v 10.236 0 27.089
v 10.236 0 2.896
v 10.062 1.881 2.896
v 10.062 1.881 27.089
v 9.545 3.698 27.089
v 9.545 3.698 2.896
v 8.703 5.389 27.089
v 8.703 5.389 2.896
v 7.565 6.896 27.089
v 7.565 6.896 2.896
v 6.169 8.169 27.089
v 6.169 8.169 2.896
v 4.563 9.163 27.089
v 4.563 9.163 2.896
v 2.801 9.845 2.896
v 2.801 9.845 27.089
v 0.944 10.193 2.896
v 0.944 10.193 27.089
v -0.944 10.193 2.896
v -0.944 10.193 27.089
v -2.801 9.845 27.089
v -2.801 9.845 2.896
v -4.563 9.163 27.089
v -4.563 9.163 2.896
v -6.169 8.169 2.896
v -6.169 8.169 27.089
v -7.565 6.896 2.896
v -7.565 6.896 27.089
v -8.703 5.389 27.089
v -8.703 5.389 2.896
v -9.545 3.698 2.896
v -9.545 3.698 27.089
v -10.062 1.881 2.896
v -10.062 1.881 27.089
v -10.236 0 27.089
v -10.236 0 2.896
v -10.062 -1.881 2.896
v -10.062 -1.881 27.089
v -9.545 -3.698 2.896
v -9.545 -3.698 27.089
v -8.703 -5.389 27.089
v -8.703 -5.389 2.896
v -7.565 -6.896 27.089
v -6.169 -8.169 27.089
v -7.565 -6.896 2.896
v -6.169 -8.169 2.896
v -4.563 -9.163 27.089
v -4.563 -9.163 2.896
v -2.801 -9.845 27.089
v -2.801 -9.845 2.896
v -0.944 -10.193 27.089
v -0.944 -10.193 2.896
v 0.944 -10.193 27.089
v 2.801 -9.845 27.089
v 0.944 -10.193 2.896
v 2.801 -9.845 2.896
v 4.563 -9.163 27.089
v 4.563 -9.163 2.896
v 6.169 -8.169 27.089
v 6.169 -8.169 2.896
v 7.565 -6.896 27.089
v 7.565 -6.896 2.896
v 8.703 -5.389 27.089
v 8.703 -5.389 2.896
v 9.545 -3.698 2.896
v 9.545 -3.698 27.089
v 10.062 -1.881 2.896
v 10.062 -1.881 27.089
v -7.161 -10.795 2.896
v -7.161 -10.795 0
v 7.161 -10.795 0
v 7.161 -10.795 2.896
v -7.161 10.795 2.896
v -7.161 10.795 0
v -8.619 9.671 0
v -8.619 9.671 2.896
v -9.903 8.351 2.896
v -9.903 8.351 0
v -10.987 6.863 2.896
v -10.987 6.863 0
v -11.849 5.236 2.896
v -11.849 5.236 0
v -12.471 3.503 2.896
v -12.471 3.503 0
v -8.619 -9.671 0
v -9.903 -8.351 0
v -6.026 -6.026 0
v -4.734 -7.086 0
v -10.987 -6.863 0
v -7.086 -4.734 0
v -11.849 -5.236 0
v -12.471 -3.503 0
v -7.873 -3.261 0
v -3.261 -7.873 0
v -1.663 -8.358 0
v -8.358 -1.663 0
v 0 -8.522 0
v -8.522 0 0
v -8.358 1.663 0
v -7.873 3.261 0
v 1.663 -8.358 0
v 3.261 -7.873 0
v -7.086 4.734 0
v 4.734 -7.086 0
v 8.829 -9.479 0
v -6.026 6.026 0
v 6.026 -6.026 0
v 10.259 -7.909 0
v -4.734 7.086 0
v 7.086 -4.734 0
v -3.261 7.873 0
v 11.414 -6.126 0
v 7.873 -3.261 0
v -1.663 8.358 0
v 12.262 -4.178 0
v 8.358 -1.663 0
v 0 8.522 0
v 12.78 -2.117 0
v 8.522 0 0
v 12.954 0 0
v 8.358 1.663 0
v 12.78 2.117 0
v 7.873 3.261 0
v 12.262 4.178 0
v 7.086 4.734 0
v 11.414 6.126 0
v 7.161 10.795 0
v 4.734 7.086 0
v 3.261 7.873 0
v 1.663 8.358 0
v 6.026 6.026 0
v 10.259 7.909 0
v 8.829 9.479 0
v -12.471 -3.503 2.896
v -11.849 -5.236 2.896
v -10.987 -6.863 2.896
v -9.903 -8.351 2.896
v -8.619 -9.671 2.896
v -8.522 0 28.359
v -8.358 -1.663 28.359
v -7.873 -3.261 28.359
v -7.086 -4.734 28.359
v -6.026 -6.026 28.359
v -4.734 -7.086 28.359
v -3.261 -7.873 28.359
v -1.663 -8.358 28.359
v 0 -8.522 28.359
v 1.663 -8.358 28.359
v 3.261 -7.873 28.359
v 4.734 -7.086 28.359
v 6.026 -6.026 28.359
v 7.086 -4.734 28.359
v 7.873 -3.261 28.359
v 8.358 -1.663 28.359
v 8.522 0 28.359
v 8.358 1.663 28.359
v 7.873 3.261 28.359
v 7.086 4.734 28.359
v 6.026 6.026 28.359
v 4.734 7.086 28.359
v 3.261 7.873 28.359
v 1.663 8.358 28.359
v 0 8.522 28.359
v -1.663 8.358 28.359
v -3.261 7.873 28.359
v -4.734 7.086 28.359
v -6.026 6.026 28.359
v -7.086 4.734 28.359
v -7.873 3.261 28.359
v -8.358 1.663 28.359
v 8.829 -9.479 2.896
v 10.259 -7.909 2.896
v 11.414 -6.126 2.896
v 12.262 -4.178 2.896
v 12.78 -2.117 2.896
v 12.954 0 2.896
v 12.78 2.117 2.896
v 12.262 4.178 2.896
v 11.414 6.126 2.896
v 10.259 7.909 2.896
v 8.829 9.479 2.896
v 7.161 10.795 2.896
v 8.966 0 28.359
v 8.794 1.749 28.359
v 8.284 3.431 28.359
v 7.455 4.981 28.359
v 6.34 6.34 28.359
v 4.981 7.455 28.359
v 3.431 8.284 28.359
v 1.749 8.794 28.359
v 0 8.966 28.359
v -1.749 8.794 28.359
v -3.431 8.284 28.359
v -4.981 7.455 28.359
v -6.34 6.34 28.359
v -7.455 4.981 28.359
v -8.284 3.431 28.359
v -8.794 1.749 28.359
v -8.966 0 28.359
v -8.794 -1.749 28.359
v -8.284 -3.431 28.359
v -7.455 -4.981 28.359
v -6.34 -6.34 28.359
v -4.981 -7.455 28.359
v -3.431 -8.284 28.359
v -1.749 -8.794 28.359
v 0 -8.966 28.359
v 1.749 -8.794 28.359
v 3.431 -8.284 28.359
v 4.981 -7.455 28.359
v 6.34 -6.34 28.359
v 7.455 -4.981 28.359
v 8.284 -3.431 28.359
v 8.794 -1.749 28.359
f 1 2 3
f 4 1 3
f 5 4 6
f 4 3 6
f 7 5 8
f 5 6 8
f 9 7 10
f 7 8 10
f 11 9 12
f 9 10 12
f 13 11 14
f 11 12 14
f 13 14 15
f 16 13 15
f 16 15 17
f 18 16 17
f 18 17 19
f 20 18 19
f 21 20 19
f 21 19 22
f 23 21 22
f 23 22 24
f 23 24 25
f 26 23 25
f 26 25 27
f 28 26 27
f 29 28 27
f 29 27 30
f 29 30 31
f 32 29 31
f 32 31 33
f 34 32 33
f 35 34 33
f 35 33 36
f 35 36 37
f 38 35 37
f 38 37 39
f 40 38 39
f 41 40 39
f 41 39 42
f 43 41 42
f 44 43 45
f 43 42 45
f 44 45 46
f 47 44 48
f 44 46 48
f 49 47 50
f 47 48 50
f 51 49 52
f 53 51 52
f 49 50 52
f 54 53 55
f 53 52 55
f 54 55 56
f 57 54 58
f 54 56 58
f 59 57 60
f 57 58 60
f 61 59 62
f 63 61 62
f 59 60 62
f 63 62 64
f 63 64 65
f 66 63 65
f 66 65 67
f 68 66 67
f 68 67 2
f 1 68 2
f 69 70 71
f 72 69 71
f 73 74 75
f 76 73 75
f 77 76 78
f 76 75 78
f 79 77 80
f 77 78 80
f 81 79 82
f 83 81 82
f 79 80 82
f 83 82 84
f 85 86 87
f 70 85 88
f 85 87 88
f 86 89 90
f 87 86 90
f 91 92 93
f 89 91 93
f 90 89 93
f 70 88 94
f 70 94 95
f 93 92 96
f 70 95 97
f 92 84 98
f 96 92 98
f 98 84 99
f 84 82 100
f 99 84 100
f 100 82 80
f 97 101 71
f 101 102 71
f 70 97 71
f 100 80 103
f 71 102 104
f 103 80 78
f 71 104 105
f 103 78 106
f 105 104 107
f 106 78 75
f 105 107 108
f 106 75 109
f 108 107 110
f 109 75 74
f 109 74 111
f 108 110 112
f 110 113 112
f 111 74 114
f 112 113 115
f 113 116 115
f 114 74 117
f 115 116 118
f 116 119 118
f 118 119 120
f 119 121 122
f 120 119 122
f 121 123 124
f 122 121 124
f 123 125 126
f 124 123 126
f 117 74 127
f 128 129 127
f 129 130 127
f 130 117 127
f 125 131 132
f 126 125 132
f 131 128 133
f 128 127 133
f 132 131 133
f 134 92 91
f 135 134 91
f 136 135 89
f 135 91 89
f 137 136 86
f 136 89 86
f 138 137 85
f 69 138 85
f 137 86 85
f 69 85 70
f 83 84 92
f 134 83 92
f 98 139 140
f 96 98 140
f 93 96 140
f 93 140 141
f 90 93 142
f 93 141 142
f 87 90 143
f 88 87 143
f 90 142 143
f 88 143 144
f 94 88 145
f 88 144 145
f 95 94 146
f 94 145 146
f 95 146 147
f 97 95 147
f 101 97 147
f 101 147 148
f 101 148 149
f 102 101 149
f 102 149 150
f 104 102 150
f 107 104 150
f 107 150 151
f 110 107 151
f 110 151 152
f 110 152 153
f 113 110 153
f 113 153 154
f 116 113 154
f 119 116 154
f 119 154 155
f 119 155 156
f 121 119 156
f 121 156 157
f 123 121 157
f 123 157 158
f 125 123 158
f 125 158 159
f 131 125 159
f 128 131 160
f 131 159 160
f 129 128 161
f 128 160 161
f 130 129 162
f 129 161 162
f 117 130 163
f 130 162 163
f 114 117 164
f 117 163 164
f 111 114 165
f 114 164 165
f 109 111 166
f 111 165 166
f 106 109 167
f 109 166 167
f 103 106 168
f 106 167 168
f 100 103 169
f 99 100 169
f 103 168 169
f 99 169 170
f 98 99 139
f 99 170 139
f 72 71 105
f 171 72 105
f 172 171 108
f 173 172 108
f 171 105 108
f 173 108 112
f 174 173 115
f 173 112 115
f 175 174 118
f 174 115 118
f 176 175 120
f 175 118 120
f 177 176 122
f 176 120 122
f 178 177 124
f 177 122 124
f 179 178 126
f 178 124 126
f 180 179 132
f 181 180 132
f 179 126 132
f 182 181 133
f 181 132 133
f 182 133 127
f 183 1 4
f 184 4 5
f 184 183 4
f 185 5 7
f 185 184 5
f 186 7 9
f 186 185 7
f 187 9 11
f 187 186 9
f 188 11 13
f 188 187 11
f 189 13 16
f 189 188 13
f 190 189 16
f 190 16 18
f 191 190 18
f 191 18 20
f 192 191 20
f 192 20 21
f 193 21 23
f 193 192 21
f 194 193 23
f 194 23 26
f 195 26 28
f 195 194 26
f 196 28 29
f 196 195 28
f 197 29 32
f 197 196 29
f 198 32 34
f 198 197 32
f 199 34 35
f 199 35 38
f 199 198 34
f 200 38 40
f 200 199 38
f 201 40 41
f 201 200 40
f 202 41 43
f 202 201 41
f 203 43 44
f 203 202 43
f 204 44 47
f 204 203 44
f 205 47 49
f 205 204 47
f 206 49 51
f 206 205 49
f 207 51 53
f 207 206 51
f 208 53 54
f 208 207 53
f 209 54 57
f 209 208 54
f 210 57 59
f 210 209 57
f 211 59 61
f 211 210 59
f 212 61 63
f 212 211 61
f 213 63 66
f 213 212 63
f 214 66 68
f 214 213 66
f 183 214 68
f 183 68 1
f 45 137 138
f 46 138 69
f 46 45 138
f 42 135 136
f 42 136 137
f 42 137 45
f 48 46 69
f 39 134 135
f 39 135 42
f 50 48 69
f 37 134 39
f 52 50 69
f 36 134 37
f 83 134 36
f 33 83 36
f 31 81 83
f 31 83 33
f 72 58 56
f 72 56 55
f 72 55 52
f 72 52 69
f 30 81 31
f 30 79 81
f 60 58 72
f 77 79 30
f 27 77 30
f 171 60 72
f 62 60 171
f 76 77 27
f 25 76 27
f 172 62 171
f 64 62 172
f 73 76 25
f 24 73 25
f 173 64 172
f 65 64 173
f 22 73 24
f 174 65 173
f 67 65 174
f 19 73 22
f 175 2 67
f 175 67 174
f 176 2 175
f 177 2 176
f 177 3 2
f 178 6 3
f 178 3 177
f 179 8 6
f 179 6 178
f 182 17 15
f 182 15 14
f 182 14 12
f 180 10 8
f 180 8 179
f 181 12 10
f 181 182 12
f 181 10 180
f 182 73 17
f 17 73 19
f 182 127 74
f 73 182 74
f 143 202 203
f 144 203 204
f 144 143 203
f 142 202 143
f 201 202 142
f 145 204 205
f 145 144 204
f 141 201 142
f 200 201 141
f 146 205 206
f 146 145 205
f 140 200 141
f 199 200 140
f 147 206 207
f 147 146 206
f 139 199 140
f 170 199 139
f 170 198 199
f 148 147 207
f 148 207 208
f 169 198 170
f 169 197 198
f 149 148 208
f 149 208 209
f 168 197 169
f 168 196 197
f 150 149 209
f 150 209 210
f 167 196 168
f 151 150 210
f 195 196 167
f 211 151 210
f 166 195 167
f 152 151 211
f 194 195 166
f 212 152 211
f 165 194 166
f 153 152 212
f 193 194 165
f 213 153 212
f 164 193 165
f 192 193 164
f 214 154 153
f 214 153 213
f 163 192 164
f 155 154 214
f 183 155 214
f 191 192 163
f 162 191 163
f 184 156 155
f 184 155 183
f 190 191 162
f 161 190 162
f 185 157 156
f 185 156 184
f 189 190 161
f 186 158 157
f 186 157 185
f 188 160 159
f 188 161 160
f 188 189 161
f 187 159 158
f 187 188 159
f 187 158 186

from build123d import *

# Parameters (mm, degrees)
F0_R     = 10.2362
F0_R_2   = 8.51027
F1_DEPTH = 28.3591
F3_DEPTH = 2.8956
F5_D     = 17.0434
F6_SIZE  = 1.27


with BuildPart() as f1:
    # F0 (on Top) → F1 (new body)
    with BuildSketch(Plane.XY):
        Circle(F0_R)
        Circle(F0_R_2, mode=Mode.SUBTRACT)
    extrude(amount=F1_DEPTH)

    # F2 (on Top) → F3 (join)
    with BuildSketch(Plane.XY):
        with BuildLine():
            Line((-7.160593, -10.795), (7.160593, -10.795))
            ThreePointArc((7.160593, -10.795), (12.954, 0), (7.160593, 10.795))
            Line((7.160593, 10.795), (-7.160593, 10.795))
            ThreePointArc((-7.160593, 10.795), (-10.471269, 7.626181), (-12.4714, 3.502899))
            Line((-12.4714, 3.502899), (-12.4714, -3.502899))
            ThreePointArc((-12.4714, -3.502899), (-10.471269, -7.626181), (-7.160593, -10.795))
        make_face()
    extrude(amount=F3_DEPTH)

    # F5 (through all)
    with Locations(Plane(origin=(0, 0, 0), x_dir=(1, 0, 0), z_dir=(0, 0, -1))):
        with Locations((0, 0)):
            Hole(F5_D / 2)

    # F6
    f6_edges = [f1.edges().sort_by_distance(p)[0] for p in [
        (-10.2362, 0, 28.3591),
    ]]
    chamfer(f6_edges, length=F6_SIZE)


solid = f1.part
